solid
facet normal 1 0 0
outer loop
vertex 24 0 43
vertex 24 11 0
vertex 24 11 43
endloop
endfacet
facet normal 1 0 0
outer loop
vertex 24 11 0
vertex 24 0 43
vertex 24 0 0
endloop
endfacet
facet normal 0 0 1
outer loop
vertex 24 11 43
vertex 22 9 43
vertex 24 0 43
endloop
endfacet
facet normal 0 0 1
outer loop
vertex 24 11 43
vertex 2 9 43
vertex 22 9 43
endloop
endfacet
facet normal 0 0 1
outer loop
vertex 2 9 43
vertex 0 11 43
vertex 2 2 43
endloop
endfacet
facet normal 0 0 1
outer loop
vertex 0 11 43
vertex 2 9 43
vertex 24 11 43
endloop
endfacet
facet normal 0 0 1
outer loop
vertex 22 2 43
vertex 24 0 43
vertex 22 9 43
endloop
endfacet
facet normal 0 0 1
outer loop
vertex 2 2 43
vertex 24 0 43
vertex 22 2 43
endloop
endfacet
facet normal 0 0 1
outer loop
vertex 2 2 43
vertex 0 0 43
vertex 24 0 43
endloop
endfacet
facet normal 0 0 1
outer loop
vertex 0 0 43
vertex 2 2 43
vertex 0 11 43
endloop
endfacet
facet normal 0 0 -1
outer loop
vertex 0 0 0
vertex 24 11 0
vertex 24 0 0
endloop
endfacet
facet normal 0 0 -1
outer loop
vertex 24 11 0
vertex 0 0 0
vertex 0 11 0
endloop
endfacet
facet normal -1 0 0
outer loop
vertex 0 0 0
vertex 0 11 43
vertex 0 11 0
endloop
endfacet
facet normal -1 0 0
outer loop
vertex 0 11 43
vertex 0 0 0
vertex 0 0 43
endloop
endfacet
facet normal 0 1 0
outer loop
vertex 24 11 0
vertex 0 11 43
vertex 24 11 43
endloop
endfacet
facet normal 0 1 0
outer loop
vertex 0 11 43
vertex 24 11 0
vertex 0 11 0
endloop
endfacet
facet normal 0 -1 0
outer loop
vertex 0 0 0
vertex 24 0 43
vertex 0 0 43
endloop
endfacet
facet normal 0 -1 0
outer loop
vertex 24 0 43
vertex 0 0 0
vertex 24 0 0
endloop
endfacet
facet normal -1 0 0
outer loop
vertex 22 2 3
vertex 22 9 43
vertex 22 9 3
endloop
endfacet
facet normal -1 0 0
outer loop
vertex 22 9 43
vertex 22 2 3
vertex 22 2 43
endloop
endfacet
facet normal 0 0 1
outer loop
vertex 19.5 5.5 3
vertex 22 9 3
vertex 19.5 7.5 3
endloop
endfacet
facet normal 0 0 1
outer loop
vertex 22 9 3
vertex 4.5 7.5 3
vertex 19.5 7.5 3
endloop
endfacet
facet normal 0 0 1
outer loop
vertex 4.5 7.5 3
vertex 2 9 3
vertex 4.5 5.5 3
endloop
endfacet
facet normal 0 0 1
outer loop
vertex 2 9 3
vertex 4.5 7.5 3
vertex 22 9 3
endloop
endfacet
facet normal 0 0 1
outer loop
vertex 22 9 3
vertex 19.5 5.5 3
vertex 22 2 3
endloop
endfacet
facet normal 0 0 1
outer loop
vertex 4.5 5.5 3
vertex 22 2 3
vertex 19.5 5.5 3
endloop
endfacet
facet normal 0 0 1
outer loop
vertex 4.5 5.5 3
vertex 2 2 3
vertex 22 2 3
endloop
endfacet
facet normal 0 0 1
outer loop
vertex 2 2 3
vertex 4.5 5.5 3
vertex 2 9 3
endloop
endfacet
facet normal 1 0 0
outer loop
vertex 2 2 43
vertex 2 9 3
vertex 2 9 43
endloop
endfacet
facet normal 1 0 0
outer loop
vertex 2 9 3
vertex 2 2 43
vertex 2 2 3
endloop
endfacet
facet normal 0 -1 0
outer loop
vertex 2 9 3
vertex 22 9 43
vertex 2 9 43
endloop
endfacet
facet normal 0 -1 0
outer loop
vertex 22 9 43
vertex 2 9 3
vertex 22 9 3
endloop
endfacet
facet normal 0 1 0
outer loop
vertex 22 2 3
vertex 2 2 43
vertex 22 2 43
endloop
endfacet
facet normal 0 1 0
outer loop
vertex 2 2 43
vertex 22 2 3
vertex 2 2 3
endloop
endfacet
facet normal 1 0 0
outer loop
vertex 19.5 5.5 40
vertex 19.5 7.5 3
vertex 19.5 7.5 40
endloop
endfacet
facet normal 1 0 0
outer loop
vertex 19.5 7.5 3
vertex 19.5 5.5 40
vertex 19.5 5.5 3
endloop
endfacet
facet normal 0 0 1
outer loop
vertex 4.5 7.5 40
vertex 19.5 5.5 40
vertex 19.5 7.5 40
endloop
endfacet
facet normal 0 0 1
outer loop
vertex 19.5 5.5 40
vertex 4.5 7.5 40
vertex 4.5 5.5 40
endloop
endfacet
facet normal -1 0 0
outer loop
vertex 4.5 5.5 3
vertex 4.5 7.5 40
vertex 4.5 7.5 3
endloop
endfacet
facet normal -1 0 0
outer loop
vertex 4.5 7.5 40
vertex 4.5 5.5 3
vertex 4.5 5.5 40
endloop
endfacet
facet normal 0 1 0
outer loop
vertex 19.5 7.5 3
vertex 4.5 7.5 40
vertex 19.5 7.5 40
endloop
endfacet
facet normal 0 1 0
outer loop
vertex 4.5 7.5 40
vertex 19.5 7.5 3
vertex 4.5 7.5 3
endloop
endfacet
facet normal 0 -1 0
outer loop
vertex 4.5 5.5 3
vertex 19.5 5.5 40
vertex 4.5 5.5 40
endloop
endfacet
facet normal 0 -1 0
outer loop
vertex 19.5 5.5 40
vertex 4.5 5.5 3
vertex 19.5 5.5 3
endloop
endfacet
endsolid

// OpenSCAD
length = 40;
width = 20;

moldHeight = length + 3;
moldWidth = width + 4;
moldLength = 7 + 4;

coreHeight = length - 3;
coreWidth = width - 5;
coreLength = 1 + 1;

union() {

translate([(moldWidth/2)-(coreWidth)/2,moldLength-5.5,3]) {
cube([coreWidth,coreLength,coreHeight]);
}

difference() {
cube([moldWidth,moldLength,moldHeight]);

translate([2,2,3]) {
cube([width,7,length]);
}
}
}
